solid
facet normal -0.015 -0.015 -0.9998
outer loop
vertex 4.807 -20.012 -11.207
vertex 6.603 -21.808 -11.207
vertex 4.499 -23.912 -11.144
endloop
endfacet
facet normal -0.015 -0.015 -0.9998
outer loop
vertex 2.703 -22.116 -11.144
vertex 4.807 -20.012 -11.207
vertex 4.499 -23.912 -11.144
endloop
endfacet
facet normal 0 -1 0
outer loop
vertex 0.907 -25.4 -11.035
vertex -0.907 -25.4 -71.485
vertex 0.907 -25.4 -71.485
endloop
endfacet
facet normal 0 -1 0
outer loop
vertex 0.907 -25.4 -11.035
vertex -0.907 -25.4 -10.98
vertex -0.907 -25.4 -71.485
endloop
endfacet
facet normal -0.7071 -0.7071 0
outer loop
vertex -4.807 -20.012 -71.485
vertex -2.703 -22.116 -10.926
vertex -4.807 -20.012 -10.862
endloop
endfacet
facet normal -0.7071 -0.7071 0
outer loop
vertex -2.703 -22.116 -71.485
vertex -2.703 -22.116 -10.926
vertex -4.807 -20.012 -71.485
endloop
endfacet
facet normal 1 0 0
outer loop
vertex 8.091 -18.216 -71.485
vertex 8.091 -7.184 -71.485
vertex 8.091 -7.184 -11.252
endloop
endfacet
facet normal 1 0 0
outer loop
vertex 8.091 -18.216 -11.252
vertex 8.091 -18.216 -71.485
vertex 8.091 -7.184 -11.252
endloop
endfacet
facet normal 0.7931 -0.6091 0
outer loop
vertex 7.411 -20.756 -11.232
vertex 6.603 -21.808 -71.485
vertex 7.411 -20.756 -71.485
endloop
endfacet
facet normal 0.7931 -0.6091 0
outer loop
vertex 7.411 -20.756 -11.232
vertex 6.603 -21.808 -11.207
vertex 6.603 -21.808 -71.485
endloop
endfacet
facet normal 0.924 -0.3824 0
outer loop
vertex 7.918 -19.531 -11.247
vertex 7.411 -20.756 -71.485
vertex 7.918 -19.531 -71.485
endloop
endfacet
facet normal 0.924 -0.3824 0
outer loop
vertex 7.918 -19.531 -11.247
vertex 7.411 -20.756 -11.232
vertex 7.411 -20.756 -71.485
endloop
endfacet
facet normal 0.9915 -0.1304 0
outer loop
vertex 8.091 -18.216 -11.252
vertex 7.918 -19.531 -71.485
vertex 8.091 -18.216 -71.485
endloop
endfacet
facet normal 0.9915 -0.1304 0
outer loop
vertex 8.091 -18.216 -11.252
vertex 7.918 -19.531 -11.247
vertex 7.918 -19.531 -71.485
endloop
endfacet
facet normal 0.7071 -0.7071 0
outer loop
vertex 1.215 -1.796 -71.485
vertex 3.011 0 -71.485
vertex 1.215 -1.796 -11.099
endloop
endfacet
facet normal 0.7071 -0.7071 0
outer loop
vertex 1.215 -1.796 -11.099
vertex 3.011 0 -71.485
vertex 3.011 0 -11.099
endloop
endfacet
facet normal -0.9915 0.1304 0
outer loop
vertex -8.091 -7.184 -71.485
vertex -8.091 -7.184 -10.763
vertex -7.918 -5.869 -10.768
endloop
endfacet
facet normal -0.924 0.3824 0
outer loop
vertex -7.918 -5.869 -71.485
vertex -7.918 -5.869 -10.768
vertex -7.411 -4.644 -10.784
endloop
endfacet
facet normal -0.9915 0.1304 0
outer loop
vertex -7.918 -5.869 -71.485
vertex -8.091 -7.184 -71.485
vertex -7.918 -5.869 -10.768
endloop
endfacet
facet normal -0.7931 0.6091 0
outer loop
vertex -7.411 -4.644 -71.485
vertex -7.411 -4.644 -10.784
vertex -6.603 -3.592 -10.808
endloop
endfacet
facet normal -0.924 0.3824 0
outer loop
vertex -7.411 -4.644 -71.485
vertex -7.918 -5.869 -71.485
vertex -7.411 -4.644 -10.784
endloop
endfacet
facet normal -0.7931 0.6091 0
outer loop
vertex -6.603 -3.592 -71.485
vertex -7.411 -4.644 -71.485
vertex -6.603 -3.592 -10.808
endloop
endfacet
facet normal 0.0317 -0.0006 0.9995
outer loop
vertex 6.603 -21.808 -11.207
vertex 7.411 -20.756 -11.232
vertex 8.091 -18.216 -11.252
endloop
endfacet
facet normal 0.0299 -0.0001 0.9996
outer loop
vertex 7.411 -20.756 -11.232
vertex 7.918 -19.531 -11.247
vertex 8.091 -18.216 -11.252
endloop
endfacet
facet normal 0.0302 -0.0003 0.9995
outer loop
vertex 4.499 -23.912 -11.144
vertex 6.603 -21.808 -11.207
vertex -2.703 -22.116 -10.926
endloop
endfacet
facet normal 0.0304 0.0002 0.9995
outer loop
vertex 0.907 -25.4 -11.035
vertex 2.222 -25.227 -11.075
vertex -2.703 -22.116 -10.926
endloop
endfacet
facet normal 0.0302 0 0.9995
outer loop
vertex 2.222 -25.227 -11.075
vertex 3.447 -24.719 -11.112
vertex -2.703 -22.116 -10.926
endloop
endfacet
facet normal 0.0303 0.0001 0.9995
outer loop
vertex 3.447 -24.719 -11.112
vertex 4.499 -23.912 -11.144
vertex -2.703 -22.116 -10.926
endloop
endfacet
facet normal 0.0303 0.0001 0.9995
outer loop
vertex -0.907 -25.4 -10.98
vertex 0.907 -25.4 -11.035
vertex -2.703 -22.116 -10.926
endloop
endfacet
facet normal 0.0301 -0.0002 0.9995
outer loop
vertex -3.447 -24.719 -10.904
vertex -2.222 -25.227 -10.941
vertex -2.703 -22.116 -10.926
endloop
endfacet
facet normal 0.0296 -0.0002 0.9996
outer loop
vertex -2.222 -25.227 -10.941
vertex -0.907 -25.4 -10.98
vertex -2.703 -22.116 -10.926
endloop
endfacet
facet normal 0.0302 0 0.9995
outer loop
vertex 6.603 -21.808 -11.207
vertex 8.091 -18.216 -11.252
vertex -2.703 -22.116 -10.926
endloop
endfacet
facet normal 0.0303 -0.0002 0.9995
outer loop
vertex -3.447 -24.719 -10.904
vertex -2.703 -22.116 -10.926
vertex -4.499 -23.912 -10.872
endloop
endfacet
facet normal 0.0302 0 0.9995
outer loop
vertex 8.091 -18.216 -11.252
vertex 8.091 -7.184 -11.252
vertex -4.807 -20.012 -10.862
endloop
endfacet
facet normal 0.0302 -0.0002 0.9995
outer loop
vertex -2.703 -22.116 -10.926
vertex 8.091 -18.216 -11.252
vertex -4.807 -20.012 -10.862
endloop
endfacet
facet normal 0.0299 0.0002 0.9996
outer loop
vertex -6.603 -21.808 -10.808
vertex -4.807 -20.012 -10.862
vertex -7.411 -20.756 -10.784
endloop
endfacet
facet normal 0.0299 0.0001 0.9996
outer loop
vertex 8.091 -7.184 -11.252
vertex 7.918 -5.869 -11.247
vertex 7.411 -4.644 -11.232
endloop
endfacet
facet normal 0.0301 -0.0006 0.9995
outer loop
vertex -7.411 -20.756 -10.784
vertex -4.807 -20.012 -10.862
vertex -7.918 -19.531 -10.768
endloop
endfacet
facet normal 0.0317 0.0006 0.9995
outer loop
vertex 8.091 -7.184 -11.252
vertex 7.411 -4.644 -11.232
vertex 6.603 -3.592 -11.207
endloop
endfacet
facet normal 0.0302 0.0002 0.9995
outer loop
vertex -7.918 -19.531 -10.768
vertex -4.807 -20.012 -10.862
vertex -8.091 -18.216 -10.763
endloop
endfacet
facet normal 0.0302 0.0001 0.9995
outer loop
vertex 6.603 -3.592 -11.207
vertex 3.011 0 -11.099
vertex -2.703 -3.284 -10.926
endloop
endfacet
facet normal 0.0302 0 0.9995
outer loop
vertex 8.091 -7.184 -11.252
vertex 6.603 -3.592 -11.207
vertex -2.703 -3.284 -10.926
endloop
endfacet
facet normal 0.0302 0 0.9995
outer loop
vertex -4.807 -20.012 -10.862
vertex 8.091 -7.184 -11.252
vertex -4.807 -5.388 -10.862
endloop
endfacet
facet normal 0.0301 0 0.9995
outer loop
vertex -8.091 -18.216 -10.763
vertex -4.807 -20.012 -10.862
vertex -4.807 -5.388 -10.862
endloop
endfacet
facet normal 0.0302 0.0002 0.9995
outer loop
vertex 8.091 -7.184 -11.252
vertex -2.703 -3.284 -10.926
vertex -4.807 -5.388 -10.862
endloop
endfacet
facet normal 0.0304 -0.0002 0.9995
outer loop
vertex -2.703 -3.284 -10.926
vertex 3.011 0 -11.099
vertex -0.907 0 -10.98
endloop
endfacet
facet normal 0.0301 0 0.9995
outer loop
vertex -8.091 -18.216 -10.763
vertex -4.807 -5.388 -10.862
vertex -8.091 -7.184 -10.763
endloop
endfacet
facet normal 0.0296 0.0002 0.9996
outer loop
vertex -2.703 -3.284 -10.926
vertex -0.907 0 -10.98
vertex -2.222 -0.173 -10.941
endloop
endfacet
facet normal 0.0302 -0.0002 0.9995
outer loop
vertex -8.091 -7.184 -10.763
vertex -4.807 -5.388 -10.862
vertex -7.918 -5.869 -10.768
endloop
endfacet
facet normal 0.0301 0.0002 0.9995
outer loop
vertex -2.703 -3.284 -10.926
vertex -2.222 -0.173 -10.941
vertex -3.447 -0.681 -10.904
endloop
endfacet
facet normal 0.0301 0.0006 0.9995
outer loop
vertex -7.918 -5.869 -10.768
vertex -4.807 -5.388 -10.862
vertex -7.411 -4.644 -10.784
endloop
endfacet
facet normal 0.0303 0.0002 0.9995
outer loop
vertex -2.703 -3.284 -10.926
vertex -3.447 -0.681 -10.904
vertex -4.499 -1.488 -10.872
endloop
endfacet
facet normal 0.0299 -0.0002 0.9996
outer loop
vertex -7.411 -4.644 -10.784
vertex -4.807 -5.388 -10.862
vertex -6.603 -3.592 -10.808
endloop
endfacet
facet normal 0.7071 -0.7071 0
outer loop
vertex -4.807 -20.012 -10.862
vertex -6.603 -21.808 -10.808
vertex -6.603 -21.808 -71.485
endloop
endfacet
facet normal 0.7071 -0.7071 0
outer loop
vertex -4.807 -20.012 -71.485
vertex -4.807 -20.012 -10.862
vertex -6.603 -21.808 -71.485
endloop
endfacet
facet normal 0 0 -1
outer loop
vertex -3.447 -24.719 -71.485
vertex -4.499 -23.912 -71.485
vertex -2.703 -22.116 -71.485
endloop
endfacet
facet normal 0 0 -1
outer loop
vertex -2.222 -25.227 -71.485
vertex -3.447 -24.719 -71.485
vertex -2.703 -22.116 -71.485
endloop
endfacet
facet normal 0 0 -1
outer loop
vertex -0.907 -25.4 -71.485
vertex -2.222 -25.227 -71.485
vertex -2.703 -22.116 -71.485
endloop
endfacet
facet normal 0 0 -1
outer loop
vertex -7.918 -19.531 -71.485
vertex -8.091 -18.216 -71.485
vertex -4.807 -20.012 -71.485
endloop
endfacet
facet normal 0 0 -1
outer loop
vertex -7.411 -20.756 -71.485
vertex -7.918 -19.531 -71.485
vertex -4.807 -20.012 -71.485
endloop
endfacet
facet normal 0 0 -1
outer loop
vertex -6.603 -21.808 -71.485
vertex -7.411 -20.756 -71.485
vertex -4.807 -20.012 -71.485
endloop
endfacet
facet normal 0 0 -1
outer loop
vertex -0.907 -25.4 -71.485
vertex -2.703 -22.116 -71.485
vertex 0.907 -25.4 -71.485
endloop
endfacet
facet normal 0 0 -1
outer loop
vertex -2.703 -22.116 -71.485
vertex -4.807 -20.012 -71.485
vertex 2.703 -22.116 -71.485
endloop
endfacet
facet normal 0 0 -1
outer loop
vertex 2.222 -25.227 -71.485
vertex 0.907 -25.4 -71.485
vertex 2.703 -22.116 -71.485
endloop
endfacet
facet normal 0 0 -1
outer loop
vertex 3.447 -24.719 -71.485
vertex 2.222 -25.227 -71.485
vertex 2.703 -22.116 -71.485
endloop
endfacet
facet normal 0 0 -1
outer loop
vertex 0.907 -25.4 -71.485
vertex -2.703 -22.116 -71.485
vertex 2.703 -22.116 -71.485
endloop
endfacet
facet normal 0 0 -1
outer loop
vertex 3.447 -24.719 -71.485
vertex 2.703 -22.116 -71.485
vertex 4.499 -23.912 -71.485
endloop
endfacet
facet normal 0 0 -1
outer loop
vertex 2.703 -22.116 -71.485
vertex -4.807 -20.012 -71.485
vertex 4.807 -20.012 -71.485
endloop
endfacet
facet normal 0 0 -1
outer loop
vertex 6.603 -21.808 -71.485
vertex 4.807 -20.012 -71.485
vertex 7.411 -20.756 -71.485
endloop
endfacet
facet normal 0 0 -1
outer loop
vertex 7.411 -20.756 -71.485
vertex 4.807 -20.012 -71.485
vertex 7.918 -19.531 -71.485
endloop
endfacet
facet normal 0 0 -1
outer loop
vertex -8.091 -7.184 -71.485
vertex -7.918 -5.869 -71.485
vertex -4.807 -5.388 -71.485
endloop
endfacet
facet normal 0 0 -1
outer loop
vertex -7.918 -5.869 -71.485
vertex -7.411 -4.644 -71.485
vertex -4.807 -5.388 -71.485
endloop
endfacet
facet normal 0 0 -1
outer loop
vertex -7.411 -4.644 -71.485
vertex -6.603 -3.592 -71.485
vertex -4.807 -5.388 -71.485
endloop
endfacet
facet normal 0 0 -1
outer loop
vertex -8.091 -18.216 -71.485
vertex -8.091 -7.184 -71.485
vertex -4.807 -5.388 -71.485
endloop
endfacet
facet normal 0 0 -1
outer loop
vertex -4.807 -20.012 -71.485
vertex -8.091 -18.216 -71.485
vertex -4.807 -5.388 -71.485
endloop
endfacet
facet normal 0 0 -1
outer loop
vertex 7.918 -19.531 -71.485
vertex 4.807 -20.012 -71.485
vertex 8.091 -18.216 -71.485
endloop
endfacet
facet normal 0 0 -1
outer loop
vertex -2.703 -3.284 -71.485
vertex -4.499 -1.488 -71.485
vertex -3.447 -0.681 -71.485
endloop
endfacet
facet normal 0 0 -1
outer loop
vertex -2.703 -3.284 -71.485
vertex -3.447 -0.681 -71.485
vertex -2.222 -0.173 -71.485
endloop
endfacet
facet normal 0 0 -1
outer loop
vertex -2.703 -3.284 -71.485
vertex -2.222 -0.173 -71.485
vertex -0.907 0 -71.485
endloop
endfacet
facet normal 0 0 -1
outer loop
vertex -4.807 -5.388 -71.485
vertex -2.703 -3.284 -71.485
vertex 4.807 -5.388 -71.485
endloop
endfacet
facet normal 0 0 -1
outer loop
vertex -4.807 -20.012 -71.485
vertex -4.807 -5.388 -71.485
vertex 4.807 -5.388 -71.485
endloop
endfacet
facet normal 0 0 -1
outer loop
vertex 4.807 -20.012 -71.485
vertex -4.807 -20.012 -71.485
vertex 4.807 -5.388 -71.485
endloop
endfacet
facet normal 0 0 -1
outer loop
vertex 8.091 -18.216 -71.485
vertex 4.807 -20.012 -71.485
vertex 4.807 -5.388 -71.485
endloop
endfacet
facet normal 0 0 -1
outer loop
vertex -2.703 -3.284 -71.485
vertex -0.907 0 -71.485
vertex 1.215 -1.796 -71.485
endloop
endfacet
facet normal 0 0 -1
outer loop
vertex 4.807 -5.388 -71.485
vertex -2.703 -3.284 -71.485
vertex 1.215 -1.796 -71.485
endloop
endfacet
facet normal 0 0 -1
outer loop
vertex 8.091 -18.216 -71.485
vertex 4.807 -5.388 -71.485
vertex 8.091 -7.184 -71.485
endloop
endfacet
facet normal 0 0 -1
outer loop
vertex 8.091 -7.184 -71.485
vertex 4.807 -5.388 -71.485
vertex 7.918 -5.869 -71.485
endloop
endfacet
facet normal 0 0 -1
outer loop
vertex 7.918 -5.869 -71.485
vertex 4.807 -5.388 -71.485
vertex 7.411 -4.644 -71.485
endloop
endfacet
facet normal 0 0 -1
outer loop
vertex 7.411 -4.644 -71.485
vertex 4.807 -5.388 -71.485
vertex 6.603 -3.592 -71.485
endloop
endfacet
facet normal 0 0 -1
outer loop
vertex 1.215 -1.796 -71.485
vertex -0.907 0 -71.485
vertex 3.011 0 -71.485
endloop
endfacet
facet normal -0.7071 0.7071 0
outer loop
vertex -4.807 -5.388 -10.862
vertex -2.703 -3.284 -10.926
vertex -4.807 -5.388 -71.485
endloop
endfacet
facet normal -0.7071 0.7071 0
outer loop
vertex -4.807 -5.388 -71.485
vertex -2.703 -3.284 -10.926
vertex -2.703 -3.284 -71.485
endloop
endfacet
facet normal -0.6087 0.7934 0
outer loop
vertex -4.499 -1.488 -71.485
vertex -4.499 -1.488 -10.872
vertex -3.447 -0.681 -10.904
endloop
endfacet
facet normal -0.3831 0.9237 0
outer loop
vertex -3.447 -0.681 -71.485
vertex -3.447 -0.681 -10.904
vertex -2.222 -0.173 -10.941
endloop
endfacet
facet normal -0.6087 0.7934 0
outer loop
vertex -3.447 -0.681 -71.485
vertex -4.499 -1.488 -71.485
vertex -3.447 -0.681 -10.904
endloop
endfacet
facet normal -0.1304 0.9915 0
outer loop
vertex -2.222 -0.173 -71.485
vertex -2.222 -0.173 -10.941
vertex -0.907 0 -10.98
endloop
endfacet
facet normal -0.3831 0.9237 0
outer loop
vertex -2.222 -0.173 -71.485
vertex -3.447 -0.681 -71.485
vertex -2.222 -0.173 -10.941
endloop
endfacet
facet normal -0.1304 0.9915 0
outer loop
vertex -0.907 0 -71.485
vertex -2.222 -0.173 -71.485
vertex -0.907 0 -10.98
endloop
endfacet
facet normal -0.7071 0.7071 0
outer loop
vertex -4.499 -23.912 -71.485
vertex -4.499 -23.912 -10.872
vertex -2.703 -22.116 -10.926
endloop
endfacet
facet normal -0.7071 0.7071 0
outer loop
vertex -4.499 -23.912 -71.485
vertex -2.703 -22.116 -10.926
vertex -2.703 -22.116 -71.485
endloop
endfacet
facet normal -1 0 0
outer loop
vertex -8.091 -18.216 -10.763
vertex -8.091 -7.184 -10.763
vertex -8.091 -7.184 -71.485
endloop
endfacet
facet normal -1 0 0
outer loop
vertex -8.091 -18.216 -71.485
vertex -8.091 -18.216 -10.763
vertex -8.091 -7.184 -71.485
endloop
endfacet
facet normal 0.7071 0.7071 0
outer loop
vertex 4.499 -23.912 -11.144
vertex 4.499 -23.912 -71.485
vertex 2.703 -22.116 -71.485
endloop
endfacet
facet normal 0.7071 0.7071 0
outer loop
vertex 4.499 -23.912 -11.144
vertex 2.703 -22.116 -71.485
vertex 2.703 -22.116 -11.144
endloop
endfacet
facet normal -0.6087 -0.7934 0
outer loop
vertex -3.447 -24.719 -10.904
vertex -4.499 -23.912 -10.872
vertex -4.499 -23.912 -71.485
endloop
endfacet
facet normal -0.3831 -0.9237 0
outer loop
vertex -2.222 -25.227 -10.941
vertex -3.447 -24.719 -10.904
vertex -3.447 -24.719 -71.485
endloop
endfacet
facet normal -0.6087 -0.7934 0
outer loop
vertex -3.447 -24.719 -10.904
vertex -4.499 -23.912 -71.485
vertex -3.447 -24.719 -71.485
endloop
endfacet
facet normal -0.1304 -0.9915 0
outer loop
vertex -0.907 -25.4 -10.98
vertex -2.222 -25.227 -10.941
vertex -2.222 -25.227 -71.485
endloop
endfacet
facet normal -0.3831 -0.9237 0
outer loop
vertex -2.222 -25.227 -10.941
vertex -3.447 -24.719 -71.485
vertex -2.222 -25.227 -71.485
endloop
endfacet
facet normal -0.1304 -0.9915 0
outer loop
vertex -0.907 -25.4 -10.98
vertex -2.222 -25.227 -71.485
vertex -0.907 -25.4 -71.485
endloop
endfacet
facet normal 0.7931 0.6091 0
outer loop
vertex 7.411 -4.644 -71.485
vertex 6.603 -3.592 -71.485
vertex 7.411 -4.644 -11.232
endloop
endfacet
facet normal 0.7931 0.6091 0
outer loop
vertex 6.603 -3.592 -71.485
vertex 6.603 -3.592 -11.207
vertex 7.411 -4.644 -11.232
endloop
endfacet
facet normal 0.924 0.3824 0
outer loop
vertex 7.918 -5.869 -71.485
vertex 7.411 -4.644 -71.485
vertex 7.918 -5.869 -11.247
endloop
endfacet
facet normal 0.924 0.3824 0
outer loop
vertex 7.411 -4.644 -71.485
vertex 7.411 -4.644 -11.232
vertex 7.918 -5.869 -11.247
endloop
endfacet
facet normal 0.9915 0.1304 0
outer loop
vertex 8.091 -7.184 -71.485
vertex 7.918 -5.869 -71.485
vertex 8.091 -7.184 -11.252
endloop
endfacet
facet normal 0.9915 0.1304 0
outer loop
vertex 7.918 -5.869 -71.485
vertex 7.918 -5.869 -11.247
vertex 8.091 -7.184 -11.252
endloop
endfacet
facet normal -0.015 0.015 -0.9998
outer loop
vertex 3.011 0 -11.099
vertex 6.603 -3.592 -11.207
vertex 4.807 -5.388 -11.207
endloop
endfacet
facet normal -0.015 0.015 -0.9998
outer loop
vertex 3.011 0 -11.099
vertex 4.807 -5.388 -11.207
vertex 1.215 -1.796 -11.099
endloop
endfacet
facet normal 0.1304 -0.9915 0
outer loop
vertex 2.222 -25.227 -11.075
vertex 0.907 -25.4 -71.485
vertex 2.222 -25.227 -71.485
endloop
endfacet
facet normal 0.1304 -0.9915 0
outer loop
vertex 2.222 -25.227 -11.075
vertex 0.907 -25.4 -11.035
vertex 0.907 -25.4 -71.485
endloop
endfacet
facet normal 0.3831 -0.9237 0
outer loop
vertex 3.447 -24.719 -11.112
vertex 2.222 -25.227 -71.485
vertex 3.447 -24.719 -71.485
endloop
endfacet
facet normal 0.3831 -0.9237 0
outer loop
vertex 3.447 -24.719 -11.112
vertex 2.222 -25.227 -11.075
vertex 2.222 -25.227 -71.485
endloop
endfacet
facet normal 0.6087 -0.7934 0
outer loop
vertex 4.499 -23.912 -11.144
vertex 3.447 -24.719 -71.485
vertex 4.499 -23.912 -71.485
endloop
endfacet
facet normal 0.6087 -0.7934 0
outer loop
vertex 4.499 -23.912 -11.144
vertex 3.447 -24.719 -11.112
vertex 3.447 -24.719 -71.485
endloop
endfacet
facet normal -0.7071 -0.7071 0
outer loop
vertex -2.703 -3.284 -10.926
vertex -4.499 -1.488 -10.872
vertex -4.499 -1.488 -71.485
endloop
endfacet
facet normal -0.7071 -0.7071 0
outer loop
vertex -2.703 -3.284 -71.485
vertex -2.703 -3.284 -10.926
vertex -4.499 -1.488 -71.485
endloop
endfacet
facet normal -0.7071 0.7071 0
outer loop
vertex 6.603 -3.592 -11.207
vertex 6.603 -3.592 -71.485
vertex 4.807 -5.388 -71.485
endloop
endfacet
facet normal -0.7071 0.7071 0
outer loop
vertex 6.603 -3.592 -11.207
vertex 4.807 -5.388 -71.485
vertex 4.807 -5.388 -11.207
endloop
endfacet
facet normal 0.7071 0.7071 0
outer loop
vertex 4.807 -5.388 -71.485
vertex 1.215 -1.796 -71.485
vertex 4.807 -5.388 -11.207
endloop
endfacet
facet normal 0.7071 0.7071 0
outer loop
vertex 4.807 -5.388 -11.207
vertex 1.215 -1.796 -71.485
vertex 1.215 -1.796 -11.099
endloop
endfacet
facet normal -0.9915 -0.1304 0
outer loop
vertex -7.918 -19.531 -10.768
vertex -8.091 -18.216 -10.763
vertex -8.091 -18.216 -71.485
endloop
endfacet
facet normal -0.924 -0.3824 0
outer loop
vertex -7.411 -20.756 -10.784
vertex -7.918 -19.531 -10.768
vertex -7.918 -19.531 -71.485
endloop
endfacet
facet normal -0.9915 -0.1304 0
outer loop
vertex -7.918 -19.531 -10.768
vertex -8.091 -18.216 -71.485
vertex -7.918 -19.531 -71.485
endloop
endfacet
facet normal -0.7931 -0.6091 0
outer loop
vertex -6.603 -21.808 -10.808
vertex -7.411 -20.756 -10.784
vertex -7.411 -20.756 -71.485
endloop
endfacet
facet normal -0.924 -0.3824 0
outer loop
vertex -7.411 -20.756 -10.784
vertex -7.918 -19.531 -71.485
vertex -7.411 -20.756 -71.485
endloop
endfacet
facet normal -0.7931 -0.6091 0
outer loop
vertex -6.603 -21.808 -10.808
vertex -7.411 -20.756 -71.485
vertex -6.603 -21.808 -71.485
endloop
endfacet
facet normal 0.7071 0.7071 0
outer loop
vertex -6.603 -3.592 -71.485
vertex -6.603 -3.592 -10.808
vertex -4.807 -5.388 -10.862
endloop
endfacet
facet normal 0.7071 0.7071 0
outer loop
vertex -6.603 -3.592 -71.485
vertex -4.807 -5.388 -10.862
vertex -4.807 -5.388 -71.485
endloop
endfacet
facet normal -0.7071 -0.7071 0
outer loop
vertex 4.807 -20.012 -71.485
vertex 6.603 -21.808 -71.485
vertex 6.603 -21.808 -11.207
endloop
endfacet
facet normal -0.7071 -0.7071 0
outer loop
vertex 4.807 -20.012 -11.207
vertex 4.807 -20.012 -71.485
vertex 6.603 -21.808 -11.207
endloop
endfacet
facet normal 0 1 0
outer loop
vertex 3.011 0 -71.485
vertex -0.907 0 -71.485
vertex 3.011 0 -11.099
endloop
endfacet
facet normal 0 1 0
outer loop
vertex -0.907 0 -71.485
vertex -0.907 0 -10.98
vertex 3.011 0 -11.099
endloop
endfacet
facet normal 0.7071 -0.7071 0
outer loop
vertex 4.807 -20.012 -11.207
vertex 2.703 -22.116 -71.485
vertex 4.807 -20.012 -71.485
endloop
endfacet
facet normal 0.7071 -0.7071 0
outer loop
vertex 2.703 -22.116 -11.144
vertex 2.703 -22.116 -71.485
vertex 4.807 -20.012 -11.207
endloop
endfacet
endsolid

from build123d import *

# Parameters (mm, degrees)
F1_DEPTH = 25.4
F2_SIZE  = 5.08
F3_R     = 5.08
F4_DEPTH = 2.54
F5_DEPTH = 2.54
F6_DEPTH = 2.54
F7_DEPTH = 2.54


with BuildPart() as f1:
    # F0 (on Front) → F1 (new body)
    with BuildSketch(Plane.XZ):
        Polygon((-8.0913305283, -71.4852660894), (8.0913305283, -71.4852660894), (8.0913305283, -11.2523705258), (-8.0913305283, -10.7631014283), align=None)
    extrude(amount=F1_DEPTH)

    # F2
    f2_edges = [f1.edges().sort_by_distance(p)[0] for p in [
        (8.091331, -25.4, -41.368818),
        (-8.091331, -25.4, -41.124184),
        (-8.091331, 0, -41.124184),
        (8.091331, 0, -41.368818),
    ]]
    chamfer(f2_edges, length=F2_SIZE)

    # F3
    f3_edges = [f1.edges().sort_by_distance(p)[0] for p in [
        (-3.011331, 0, -41.200979),
        (-8.091331, -20.32, -41.124184),
        (-8.091331, -5.08, -41.124184),
        (8.091331, -5.08, -41.368818),
        (8.091331, -20.32, -41.368818),
        (-3.011331, -25.4, -41.200979),
        (3.011331, -25.4, -41.292024),
    ]]
    fillet(f3_edges, radius=F3_R)

    # F4 (cut): a face of the model
    f4_faces = [f1.faces().sort_by_distance(p)[0] for p in [
        (-5.5515144762, -22.859816052, -41.1625783561),
    ]]
    extrude(f4_faces, amount=-F4_DEPTH, mode=Mode.SUBTRACT)

    # F5 (cut): a face of the model
    f5_faces = [f1.faces().sort_by_distance(p)[0] for p in [
        (-5.5515144762, -2.540183948, -41.1625783561),
    ]]
    extrude(f5_faces, amount=-F5_DEPTH, mode=Mode.SUBTRACT)

    # F6 (cut): a face of the model
    f6_faces = [f1.faces().sort_by_distance(p)[0] for p in [
        (4.8068429061, -1.7955123778, -41.3191664522),
    ]]
    extrude(f6_faces, amount=-F6_DEPTH, mode=Mode.SUBTRACT)

    # F7 (cut): a face of the model
    f7_faces = [f1.faces().sort_by_distance(p)[0] for p in [
        (5.5511455564, -22.8601849718, -41.3304181334),
    ]]
    extrude(f7_faces, amount=-F7_DEPTH, mode=Mode.SUBTRACT)


solid = f1.part
